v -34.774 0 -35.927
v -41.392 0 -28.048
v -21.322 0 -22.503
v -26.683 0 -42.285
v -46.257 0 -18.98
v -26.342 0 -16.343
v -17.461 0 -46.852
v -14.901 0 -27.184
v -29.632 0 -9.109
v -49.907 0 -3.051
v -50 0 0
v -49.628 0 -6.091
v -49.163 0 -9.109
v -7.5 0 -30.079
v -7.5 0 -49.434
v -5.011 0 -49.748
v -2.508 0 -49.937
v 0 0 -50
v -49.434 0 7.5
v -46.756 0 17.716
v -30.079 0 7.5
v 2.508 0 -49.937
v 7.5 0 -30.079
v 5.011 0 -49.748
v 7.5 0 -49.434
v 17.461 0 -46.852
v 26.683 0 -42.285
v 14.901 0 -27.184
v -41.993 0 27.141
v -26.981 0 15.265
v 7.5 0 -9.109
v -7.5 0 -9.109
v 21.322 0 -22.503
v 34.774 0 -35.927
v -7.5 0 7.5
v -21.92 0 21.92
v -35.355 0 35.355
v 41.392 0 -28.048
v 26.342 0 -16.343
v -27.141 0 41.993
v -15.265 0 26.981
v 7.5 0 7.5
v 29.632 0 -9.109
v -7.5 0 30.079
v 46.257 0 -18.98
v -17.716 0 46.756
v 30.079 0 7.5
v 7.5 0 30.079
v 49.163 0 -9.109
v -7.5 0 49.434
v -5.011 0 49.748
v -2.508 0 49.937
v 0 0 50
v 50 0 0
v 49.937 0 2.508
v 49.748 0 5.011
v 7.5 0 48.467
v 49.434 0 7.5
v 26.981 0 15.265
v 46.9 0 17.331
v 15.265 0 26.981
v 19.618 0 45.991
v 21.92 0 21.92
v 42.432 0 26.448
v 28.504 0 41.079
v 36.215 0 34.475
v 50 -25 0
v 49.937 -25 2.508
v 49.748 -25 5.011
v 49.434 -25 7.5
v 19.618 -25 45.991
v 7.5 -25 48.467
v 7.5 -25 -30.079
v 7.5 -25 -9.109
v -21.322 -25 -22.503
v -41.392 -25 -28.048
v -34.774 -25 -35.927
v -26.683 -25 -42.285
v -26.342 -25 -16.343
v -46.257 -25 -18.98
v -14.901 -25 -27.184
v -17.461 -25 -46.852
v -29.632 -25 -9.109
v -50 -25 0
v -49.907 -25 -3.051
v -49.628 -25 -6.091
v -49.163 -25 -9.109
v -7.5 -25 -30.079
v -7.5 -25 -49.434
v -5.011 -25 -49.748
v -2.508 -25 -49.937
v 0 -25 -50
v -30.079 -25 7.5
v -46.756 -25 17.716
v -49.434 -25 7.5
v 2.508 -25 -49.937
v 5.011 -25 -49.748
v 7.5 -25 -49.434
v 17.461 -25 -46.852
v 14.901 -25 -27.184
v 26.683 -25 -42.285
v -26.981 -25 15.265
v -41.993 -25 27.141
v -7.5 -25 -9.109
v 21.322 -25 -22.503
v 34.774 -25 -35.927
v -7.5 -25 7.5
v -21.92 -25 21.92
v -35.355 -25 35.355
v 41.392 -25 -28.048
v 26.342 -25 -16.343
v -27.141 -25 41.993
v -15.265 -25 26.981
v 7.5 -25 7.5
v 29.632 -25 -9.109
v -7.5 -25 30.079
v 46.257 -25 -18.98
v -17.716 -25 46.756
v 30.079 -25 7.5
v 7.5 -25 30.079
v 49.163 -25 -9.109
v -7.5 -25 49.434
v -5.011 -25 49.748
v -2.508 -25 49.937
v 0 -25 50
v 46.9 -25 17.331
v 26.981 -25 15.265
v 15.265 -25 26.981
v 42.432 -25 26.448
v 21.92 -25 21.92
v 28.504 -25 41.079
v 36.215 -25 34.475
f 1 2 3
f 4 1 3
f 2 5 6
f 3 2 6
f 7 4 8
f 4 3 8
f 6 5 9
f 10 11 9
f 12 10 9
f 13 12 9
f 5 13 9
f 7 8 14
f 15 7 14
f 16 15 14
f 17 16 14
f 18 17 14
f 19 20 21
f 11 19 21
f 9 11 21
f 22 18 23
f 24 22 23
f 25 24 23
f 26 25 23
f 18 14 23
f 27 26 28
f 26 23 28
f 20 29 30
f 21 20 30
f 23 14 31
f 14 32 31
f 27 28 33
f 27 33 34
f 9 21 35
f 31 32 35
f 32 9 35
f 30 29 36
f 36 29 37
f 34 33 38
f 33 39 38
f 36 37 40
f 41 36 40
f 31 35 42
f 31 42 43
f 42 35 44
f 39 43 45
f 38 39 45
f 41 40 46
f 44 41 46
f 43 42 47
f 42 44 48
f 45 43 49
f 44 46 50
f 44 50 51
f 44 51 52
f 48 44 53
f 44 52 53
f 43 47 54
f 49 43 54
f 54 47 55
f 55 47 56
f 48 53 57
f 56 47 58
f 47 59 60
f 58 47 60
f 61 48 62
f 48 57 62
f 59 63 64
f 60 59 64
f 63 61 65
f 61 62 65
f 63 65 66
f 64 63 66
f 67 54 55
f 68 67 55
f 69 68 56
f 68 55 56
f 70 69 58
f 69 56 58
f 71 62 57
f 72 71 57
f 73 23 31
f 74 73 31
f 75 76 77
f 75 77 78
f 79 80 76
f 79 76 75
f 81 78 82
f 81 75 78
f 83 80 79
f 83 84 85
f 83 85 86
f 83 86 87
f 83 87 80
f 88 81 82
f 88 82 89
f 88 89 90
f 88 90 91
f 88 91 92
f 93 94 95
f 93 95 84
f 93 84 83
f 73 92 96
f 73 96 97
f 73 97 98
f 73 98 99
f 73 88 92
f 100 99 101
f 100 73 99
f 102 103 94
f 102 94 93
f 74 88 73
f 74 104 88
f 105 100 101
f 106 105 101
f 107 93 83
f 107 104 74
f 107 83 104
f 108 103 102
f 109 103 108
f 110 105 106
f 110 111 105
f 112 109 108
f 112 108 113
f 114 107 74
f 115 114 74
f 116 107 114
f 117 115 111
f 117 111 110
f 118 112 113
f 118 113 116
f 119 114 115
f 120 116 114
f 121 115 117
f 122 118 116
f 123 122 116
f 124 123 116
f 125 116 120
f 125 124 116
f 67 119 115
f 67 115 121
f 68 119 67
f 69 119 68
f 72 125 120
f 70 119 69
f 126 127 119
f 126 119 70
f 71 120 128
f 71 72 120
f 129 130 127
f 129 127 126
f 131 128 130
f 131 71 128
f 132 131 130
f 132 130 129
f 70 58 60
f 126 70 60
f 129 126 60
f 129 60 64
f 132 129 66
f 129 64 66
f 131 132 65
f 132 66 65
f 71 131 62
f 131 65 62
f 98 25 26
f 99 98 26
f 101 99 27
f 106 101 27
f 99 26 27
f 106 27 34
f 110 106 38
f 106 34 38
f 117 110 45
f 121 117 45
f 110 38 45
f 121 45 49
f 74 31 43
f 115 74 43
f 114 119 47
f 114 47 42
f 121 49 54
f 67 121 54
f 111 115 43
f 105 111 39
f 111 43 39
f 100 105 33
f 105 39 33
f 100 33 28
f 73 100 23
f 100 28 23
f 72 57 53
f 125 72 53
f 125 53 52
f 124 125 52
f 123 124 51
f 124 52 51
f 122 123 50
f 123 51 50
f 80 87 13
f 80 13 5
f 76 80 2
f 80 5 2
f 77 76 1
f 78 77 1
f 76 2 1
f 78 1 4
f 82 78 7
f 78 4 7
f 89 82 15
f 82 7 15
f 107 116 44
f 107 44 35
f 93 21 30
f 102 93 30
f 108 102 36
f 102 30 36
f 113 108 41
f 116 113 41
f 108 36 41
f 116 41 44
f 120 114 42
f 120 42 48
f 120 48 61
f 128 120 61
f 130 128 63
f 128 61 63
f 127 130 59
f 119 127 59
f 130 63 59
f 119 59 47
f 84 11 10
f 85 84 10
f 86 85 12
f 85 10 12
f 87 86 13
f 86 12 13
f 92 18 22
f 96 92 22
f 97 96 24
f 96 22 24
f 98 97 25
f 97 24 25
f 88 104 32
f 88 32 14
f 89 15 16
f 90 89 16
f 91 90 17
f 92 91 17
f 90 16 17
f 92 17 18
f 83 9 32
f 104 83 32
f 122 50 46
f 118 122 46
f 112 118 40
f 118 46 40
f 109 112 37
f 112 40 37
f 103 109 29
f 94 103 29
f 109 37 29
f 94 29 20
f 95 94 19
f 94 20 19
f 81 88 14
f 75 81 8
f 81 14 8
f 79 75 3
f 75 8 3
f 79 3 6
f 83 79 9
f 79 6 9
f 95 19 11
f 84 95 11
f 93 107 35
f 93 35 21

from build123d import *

# Parameters (mm, degrees)
F1_DEPTH = 25


with BuildPart() as f1:
    # F0 (on Front) → F1 (new body)
    with BuildSketch(Plane.XZ):
        with BuildLine():
            Line((-7.5, 30.0790624854), (-7.5, 49.4342998332))
            ThreePointArc((-7.5, 49.4342998332), (-35.3553390593, 35.3553390593), (-49.4342998332, 7.5))
            Line((-49.4342998332, 7.5), (-30.0790624854, 7.5))
            ThreePointArc((-30.0790624854, 7.5), (-21.9203102168, 21.9203102168), (-7.5, 30.0790624854))
        make_face()
        with BuildLine():
            ThreePointArc((49.4342998332, 7.5), (39.5276683909, 30.6196576007), (19.6180084329, 45.9905832223))
            Line((19.6180084329, 45.9905832223), (7.5, 48.4671927359))
            Line((7.5, 48.4671927359), (7.5, 30.0790624854))
            ThreePointArc((7.5, 30.0790624854), (21.9203102168, 21.9203102168), (30.0790624854, 7.5))
            Line((30.0790624854, 7.5), (49.4342998332, 7.5))
        make_face()
        with BuildLine():
            ThreePointArc((7.5, -49.4342998332), (34.773891693, -35.9273775348), (49.1633315746, -9.1086128737))
            Line((49.1633315746, -9.1086128737), (29.631624517, -9.1086128737))
            ThreePointArc((29.631624517, -9.1086128737), (21.322038459, -22.502681528), (7.5, -30.0790624854))
            Line((7.5, -30.0790624854), (7.5, -49.4342998332))
        make_face()
        with BuildLine():
            Line((49.1633315746, -9.1086128737), (50, 0))
            Line((50, 0), (31, 0))
            ThreePointArc((31, 0), (30.6559974559, -4.6054120322), (29.631624517, -9.1086128737))
            Line((29.631624517, -9.1086128737), (49.1633315746, -9.1086128737))
        make_face()
        with BuildLine():
            ThreePointArc((50, 0), (49.8583743801, 3.7606520937), (49.4342998332, 7.5))
            Line((49.4342998332, 7.5), (30.0790624854, 7.5))
            ThreePointArc((30.0790624854, 7.5), (30.7689042464, 3.7781650939), (31, 0))
            Line((31, 0), (50, 0))
        make_face()
        with BuildLine():
            Line((7.5, 48.4671927359), (0, 50))
            Line((0, 50), (0, 31))
            ThreePointArc((0, 31), (3.7781650939, 30.7689042464), (7.5, 30.0790624854))
            Line((7.5, 30.0790624854), (7.5, 48.4671927359))
        make_face()
        with BuildLine():
            Line((-30.0790624854, 7.5), (-49.4342998332, 7.5))
            Line((-49.4342998332, 7.5), (-50, 0))
            Line((-50, 0), (-31, 0))
            ThreePointArc((-31, 0), (-30.7689042464, 3.7781650939), (-30.0790624854, 7.5))
        make_face()
        with BuildLine():
            Line((-31, 0), (-50, 0))
            ThreePointArc((-50, 0), (-49.790393545, -4.5734790515), (-49.1633315746, -9.1086128737))
            Line((-49.1633315746, -9.1086128737), (-29.631624517, -9.1086128737))
            ThreePointArc((-29.631624517, -9.1086128737), (-30.6559974559, -4.6054120322), (-31, 0))
        make_face()
        with BuildLine():
            Line((-29.631624517, -9.1086128737), (-49.1633315746, -9.1086128737))
            ThreePointArc((-49.1633315746, -9.1086128737), (-34.773891693, -35.9273775348), (-7.5, -49.4342998332))
            Line((-7.5, -49.4342998332), (-7.5, -30.0790624854))
            ThreePointArc((-7.5, -30.0790624854), (-21.322038459, -22.502681528), (-29.631624517, -9.1086128737))
        make_face()
        with BuildLine():
            Line((-7.5, -30.0790624854), (-7.5, -49.4342998332))
            ThreePointArc((-7.5, -49.4342998332), (-3.7606520937, -49.8583743801), (0, -50))
            Line((0, -50), (0, -31))
            ThreePointArc((0, -31), (-3.7781650939, -30.7689042464), (-7.5, -30.0790624854))
        make_face()
        with BuildLine():
            ThreePointArc((0, -50), (3.7606520937, -49.8583743801), (7.5, -49.4342998332))
            Line((7.5, -49.4342998332), (7.5, -30.0790624854))
            ThreePointArc((7.5, -30.0790624854), (3.7781650939, -30.7689042464), (0, -31))
            Line((0, -31), (0, -50))
        make_face()
        with BuildLine():
            Line((0, 31), (0, 50))
            ThreePointArc((0, 50), (-3.7606520937, 49.8583743801), (-7.5, 49.4342998332))
            Line((-7.5, 49.4342998332), (-7.5, 30.0790624854))
            ThreePointArc((-7.5, 30.0790624854), (-3.7781650939, 30.7689042464), (0, 31))
        make_face()
        with BuildLine():
            Line((-7.5, 7.5), (-30.0790624854, 7.5))
            ThreePointArc((-30.0790624854, 7.5), (-30.7689042464, 3.7781650939), (-31, 0))
            Line((-31, 0), (-7.5, 0))
            Line((-7.5, 0), (-7.5, 7.5))
        make_face()
        with BuildLine():
            Line((-7.5, -9.1086128737), (-7.5, 0))
            Line((-7.5, 0), (-31, 0))
            ThreePointArc((-31, 0), (-30.6559974559, -4.6054120322), (-29.631624517, -9.1086128737))
            Line((-29.631624517, -9.1086128737), (-7.5, -9.1086128737))
        make_face()
        with BuildLine():
            ThreePointArc((31, 0), (30.7689042464, 3.7781650939), (30.0790624854, 7.5))
            Line((30.0790624854, 7.5), (7.5, 7.5))
            Line((7.5, 7.5), (7.5, 0))
            Line((7.5, 0), (31, 0))
        make_face()
        with BuildLine():
            Line((31, 0), (7.5, 0))
            Line((7.5, 0), (7.5, -9.1086128737))
            Line((7.5, -9.1086128737), (29.631624517, -9.1086128737))
            ThreePointArc((29.631624517, -9.1086128737), (30.6559974559, -4.6054120322), (31, 0))
        make_face()
        with BuildLine():
            ThreePointArc((7.5, 0), (5.3033008589, 5.3033008589), (0, 7.5))
            Line((0, 7.5), (0, 2.5))
            ThreePointArc((0, 2.5), (1.767766953, 1.767766953), (2.5, 0))
            Line((2.5, 0), (7.5, 0))
        make_face()
        with BuildLine():
            Line((0, 2.5), (0, 7.5))
            ThreePointArc((0, 7.5), (-5.3033008589, 5.3033008589), (-7.5, 0))
            Line((-7.5, 0), (-2.5, 0))
            ThreePointArc((-2.5, 0), (-1.767766953, 1.767766953), (0, 2.5))
        make_face()
        with BuildLine():
            ThreePointArc((0, -7.5), (5.3033008589, -5.3033008589), (7.5, 0))
            Line((7.5, 0), (2.5, 0))
            ThreePointArc((2.5, 0), (1.767766953, -1.767766953), (0, -2.5))
            Line((0, -2.5), (0, -7.5))
        make_face()
        with BuildLine():
            Line((-2.5, 0), (-7.5, 0))
            ThreePointArc((-7.5, 0), (-5.3033008589, -5.3033008589), (0, -7.5))
            Line((0, -7.5), (0, -2.5))
            ThreePointArc((0, -2.5), (-1.767766953, -1.767766953), (-2.5, 0))
        make_face()
        with BuildLine():
            Line((0, 0), (-2.5, 0))
            ThreePointArc((-2.5, 0), (-1.767766953, -1.767766953), (0, -2.5))
            Line((0, -2.5), (0, 0))
        make_face()
        with BuildLine():
            ThreePointArc((0, -2.5), (1.767766953, -1.767766953), (2.5, 0))
            Line((2.5, 0), (0, 0))
            Line((0, 0), (0, -2.5))
        make_face()
        with BuildLine():
            ThreePointArc((2.5, 0), (1.767766953, 1.767766953), (0, 2.5))
            Line((0, 2.5), (0, 0))
            Line((0, 0), (2.5, 0))
        make_face()
        with BuildLine():
            Line((0, 0), (0, 2.5))
            ThreePointArc((0, 2.5), (-1.767766953, 1.767766953), (-2.5, 0))
            Line((-2.5, 0), (0, 0))
        make_face()
        with BuildLine():
            Line((7.5, 7.5), (0, 7.5))
            ThreePointArc((0, 7.5), (5.3033008589, 5.3033008589), (7.5, 0))
            Line((7.5, 0), (7.5, 7.5))
        make_face()
        with BuildLine():
            ThreePointArc((-7.5, 0), (-5.3033008589, 5.3033008589), (0, 7.5))
            Line((0, 7.5), (-7.5, 7.5))
            Line((-7.5, 7.5), (-7.5, 0))
        make_face()
        with BuildLine():
            ThreePointArc((0, -7.5), (-5.3033008589, -5.3033008589), (-7.5, 0))
            Line((-7.5, 0), (-7.5, -9.1086128737))
            Line((-7.5, -9.1086128737), (0, -9.1086128737))
            Line((0, -9.1086128737), (0, -7.5))
        make_face()
        with BuildLine():
            Line((7.5, -9.1086128737), (7.5, 0))
            ThreePointArc((7.5, 0), (5.3033008589, -5.3033008589), (0, -7.5))
            Line((0, -7.5), (0, -9.1086128737))
            Line((0, -9.1086128737), (7.5, -9.1086128737))
        make_face()
        with BuildLine():
            Line((0, 7.5), (0, 31))
            ThreePointArc((0, 31), (-3.7781650939, 30.7689042464), (-7.5, 30.0790624854))
            Line((-7.5, 30.0790624854), (-7.5, 7.5))
            Line((-7.5, 7.5), (0, 7.5))
        make_face()
        with BuildLine():
            ThreePointArc((7.5, 30.0790624854), (3.7781650939, 30.7689042464), (0, 31))
            Line((0, 31), (0, 7.5))
            Line((0, 7.5), (7.5, 7.5))
            Line((7.5, 7.5), (7.5, 30.0790624854))
        make_face()
        with BuildLine():
            Line((0, -9.1086128737), (-7.5, -9.1086128737))
            Line((-7.5, -9.1086128737), (-7.5, -30.0790624854))
            ThreePointArc((-7.5, -30.0790624854), (-3.7781650939, -30.7689042464), (0, -31))
            Line((0, -31), (0, -9.1086128737))
        make_face()
        with BuildLine():
            Line((7.5, -30.0790624854), (7.5, -9.1086128737))
            Line((7.5, -9.1086128737), (0, -9.1086128737))
            Line((0, -9.1086128737), (0, -31))
            ThreePointArc((0, -31), (3.7781650939, -30.7689042464), (7.5, -30.0790624854))
        make_face()
    extrude(amount=F1_DEPTH)


solid = f1.part
